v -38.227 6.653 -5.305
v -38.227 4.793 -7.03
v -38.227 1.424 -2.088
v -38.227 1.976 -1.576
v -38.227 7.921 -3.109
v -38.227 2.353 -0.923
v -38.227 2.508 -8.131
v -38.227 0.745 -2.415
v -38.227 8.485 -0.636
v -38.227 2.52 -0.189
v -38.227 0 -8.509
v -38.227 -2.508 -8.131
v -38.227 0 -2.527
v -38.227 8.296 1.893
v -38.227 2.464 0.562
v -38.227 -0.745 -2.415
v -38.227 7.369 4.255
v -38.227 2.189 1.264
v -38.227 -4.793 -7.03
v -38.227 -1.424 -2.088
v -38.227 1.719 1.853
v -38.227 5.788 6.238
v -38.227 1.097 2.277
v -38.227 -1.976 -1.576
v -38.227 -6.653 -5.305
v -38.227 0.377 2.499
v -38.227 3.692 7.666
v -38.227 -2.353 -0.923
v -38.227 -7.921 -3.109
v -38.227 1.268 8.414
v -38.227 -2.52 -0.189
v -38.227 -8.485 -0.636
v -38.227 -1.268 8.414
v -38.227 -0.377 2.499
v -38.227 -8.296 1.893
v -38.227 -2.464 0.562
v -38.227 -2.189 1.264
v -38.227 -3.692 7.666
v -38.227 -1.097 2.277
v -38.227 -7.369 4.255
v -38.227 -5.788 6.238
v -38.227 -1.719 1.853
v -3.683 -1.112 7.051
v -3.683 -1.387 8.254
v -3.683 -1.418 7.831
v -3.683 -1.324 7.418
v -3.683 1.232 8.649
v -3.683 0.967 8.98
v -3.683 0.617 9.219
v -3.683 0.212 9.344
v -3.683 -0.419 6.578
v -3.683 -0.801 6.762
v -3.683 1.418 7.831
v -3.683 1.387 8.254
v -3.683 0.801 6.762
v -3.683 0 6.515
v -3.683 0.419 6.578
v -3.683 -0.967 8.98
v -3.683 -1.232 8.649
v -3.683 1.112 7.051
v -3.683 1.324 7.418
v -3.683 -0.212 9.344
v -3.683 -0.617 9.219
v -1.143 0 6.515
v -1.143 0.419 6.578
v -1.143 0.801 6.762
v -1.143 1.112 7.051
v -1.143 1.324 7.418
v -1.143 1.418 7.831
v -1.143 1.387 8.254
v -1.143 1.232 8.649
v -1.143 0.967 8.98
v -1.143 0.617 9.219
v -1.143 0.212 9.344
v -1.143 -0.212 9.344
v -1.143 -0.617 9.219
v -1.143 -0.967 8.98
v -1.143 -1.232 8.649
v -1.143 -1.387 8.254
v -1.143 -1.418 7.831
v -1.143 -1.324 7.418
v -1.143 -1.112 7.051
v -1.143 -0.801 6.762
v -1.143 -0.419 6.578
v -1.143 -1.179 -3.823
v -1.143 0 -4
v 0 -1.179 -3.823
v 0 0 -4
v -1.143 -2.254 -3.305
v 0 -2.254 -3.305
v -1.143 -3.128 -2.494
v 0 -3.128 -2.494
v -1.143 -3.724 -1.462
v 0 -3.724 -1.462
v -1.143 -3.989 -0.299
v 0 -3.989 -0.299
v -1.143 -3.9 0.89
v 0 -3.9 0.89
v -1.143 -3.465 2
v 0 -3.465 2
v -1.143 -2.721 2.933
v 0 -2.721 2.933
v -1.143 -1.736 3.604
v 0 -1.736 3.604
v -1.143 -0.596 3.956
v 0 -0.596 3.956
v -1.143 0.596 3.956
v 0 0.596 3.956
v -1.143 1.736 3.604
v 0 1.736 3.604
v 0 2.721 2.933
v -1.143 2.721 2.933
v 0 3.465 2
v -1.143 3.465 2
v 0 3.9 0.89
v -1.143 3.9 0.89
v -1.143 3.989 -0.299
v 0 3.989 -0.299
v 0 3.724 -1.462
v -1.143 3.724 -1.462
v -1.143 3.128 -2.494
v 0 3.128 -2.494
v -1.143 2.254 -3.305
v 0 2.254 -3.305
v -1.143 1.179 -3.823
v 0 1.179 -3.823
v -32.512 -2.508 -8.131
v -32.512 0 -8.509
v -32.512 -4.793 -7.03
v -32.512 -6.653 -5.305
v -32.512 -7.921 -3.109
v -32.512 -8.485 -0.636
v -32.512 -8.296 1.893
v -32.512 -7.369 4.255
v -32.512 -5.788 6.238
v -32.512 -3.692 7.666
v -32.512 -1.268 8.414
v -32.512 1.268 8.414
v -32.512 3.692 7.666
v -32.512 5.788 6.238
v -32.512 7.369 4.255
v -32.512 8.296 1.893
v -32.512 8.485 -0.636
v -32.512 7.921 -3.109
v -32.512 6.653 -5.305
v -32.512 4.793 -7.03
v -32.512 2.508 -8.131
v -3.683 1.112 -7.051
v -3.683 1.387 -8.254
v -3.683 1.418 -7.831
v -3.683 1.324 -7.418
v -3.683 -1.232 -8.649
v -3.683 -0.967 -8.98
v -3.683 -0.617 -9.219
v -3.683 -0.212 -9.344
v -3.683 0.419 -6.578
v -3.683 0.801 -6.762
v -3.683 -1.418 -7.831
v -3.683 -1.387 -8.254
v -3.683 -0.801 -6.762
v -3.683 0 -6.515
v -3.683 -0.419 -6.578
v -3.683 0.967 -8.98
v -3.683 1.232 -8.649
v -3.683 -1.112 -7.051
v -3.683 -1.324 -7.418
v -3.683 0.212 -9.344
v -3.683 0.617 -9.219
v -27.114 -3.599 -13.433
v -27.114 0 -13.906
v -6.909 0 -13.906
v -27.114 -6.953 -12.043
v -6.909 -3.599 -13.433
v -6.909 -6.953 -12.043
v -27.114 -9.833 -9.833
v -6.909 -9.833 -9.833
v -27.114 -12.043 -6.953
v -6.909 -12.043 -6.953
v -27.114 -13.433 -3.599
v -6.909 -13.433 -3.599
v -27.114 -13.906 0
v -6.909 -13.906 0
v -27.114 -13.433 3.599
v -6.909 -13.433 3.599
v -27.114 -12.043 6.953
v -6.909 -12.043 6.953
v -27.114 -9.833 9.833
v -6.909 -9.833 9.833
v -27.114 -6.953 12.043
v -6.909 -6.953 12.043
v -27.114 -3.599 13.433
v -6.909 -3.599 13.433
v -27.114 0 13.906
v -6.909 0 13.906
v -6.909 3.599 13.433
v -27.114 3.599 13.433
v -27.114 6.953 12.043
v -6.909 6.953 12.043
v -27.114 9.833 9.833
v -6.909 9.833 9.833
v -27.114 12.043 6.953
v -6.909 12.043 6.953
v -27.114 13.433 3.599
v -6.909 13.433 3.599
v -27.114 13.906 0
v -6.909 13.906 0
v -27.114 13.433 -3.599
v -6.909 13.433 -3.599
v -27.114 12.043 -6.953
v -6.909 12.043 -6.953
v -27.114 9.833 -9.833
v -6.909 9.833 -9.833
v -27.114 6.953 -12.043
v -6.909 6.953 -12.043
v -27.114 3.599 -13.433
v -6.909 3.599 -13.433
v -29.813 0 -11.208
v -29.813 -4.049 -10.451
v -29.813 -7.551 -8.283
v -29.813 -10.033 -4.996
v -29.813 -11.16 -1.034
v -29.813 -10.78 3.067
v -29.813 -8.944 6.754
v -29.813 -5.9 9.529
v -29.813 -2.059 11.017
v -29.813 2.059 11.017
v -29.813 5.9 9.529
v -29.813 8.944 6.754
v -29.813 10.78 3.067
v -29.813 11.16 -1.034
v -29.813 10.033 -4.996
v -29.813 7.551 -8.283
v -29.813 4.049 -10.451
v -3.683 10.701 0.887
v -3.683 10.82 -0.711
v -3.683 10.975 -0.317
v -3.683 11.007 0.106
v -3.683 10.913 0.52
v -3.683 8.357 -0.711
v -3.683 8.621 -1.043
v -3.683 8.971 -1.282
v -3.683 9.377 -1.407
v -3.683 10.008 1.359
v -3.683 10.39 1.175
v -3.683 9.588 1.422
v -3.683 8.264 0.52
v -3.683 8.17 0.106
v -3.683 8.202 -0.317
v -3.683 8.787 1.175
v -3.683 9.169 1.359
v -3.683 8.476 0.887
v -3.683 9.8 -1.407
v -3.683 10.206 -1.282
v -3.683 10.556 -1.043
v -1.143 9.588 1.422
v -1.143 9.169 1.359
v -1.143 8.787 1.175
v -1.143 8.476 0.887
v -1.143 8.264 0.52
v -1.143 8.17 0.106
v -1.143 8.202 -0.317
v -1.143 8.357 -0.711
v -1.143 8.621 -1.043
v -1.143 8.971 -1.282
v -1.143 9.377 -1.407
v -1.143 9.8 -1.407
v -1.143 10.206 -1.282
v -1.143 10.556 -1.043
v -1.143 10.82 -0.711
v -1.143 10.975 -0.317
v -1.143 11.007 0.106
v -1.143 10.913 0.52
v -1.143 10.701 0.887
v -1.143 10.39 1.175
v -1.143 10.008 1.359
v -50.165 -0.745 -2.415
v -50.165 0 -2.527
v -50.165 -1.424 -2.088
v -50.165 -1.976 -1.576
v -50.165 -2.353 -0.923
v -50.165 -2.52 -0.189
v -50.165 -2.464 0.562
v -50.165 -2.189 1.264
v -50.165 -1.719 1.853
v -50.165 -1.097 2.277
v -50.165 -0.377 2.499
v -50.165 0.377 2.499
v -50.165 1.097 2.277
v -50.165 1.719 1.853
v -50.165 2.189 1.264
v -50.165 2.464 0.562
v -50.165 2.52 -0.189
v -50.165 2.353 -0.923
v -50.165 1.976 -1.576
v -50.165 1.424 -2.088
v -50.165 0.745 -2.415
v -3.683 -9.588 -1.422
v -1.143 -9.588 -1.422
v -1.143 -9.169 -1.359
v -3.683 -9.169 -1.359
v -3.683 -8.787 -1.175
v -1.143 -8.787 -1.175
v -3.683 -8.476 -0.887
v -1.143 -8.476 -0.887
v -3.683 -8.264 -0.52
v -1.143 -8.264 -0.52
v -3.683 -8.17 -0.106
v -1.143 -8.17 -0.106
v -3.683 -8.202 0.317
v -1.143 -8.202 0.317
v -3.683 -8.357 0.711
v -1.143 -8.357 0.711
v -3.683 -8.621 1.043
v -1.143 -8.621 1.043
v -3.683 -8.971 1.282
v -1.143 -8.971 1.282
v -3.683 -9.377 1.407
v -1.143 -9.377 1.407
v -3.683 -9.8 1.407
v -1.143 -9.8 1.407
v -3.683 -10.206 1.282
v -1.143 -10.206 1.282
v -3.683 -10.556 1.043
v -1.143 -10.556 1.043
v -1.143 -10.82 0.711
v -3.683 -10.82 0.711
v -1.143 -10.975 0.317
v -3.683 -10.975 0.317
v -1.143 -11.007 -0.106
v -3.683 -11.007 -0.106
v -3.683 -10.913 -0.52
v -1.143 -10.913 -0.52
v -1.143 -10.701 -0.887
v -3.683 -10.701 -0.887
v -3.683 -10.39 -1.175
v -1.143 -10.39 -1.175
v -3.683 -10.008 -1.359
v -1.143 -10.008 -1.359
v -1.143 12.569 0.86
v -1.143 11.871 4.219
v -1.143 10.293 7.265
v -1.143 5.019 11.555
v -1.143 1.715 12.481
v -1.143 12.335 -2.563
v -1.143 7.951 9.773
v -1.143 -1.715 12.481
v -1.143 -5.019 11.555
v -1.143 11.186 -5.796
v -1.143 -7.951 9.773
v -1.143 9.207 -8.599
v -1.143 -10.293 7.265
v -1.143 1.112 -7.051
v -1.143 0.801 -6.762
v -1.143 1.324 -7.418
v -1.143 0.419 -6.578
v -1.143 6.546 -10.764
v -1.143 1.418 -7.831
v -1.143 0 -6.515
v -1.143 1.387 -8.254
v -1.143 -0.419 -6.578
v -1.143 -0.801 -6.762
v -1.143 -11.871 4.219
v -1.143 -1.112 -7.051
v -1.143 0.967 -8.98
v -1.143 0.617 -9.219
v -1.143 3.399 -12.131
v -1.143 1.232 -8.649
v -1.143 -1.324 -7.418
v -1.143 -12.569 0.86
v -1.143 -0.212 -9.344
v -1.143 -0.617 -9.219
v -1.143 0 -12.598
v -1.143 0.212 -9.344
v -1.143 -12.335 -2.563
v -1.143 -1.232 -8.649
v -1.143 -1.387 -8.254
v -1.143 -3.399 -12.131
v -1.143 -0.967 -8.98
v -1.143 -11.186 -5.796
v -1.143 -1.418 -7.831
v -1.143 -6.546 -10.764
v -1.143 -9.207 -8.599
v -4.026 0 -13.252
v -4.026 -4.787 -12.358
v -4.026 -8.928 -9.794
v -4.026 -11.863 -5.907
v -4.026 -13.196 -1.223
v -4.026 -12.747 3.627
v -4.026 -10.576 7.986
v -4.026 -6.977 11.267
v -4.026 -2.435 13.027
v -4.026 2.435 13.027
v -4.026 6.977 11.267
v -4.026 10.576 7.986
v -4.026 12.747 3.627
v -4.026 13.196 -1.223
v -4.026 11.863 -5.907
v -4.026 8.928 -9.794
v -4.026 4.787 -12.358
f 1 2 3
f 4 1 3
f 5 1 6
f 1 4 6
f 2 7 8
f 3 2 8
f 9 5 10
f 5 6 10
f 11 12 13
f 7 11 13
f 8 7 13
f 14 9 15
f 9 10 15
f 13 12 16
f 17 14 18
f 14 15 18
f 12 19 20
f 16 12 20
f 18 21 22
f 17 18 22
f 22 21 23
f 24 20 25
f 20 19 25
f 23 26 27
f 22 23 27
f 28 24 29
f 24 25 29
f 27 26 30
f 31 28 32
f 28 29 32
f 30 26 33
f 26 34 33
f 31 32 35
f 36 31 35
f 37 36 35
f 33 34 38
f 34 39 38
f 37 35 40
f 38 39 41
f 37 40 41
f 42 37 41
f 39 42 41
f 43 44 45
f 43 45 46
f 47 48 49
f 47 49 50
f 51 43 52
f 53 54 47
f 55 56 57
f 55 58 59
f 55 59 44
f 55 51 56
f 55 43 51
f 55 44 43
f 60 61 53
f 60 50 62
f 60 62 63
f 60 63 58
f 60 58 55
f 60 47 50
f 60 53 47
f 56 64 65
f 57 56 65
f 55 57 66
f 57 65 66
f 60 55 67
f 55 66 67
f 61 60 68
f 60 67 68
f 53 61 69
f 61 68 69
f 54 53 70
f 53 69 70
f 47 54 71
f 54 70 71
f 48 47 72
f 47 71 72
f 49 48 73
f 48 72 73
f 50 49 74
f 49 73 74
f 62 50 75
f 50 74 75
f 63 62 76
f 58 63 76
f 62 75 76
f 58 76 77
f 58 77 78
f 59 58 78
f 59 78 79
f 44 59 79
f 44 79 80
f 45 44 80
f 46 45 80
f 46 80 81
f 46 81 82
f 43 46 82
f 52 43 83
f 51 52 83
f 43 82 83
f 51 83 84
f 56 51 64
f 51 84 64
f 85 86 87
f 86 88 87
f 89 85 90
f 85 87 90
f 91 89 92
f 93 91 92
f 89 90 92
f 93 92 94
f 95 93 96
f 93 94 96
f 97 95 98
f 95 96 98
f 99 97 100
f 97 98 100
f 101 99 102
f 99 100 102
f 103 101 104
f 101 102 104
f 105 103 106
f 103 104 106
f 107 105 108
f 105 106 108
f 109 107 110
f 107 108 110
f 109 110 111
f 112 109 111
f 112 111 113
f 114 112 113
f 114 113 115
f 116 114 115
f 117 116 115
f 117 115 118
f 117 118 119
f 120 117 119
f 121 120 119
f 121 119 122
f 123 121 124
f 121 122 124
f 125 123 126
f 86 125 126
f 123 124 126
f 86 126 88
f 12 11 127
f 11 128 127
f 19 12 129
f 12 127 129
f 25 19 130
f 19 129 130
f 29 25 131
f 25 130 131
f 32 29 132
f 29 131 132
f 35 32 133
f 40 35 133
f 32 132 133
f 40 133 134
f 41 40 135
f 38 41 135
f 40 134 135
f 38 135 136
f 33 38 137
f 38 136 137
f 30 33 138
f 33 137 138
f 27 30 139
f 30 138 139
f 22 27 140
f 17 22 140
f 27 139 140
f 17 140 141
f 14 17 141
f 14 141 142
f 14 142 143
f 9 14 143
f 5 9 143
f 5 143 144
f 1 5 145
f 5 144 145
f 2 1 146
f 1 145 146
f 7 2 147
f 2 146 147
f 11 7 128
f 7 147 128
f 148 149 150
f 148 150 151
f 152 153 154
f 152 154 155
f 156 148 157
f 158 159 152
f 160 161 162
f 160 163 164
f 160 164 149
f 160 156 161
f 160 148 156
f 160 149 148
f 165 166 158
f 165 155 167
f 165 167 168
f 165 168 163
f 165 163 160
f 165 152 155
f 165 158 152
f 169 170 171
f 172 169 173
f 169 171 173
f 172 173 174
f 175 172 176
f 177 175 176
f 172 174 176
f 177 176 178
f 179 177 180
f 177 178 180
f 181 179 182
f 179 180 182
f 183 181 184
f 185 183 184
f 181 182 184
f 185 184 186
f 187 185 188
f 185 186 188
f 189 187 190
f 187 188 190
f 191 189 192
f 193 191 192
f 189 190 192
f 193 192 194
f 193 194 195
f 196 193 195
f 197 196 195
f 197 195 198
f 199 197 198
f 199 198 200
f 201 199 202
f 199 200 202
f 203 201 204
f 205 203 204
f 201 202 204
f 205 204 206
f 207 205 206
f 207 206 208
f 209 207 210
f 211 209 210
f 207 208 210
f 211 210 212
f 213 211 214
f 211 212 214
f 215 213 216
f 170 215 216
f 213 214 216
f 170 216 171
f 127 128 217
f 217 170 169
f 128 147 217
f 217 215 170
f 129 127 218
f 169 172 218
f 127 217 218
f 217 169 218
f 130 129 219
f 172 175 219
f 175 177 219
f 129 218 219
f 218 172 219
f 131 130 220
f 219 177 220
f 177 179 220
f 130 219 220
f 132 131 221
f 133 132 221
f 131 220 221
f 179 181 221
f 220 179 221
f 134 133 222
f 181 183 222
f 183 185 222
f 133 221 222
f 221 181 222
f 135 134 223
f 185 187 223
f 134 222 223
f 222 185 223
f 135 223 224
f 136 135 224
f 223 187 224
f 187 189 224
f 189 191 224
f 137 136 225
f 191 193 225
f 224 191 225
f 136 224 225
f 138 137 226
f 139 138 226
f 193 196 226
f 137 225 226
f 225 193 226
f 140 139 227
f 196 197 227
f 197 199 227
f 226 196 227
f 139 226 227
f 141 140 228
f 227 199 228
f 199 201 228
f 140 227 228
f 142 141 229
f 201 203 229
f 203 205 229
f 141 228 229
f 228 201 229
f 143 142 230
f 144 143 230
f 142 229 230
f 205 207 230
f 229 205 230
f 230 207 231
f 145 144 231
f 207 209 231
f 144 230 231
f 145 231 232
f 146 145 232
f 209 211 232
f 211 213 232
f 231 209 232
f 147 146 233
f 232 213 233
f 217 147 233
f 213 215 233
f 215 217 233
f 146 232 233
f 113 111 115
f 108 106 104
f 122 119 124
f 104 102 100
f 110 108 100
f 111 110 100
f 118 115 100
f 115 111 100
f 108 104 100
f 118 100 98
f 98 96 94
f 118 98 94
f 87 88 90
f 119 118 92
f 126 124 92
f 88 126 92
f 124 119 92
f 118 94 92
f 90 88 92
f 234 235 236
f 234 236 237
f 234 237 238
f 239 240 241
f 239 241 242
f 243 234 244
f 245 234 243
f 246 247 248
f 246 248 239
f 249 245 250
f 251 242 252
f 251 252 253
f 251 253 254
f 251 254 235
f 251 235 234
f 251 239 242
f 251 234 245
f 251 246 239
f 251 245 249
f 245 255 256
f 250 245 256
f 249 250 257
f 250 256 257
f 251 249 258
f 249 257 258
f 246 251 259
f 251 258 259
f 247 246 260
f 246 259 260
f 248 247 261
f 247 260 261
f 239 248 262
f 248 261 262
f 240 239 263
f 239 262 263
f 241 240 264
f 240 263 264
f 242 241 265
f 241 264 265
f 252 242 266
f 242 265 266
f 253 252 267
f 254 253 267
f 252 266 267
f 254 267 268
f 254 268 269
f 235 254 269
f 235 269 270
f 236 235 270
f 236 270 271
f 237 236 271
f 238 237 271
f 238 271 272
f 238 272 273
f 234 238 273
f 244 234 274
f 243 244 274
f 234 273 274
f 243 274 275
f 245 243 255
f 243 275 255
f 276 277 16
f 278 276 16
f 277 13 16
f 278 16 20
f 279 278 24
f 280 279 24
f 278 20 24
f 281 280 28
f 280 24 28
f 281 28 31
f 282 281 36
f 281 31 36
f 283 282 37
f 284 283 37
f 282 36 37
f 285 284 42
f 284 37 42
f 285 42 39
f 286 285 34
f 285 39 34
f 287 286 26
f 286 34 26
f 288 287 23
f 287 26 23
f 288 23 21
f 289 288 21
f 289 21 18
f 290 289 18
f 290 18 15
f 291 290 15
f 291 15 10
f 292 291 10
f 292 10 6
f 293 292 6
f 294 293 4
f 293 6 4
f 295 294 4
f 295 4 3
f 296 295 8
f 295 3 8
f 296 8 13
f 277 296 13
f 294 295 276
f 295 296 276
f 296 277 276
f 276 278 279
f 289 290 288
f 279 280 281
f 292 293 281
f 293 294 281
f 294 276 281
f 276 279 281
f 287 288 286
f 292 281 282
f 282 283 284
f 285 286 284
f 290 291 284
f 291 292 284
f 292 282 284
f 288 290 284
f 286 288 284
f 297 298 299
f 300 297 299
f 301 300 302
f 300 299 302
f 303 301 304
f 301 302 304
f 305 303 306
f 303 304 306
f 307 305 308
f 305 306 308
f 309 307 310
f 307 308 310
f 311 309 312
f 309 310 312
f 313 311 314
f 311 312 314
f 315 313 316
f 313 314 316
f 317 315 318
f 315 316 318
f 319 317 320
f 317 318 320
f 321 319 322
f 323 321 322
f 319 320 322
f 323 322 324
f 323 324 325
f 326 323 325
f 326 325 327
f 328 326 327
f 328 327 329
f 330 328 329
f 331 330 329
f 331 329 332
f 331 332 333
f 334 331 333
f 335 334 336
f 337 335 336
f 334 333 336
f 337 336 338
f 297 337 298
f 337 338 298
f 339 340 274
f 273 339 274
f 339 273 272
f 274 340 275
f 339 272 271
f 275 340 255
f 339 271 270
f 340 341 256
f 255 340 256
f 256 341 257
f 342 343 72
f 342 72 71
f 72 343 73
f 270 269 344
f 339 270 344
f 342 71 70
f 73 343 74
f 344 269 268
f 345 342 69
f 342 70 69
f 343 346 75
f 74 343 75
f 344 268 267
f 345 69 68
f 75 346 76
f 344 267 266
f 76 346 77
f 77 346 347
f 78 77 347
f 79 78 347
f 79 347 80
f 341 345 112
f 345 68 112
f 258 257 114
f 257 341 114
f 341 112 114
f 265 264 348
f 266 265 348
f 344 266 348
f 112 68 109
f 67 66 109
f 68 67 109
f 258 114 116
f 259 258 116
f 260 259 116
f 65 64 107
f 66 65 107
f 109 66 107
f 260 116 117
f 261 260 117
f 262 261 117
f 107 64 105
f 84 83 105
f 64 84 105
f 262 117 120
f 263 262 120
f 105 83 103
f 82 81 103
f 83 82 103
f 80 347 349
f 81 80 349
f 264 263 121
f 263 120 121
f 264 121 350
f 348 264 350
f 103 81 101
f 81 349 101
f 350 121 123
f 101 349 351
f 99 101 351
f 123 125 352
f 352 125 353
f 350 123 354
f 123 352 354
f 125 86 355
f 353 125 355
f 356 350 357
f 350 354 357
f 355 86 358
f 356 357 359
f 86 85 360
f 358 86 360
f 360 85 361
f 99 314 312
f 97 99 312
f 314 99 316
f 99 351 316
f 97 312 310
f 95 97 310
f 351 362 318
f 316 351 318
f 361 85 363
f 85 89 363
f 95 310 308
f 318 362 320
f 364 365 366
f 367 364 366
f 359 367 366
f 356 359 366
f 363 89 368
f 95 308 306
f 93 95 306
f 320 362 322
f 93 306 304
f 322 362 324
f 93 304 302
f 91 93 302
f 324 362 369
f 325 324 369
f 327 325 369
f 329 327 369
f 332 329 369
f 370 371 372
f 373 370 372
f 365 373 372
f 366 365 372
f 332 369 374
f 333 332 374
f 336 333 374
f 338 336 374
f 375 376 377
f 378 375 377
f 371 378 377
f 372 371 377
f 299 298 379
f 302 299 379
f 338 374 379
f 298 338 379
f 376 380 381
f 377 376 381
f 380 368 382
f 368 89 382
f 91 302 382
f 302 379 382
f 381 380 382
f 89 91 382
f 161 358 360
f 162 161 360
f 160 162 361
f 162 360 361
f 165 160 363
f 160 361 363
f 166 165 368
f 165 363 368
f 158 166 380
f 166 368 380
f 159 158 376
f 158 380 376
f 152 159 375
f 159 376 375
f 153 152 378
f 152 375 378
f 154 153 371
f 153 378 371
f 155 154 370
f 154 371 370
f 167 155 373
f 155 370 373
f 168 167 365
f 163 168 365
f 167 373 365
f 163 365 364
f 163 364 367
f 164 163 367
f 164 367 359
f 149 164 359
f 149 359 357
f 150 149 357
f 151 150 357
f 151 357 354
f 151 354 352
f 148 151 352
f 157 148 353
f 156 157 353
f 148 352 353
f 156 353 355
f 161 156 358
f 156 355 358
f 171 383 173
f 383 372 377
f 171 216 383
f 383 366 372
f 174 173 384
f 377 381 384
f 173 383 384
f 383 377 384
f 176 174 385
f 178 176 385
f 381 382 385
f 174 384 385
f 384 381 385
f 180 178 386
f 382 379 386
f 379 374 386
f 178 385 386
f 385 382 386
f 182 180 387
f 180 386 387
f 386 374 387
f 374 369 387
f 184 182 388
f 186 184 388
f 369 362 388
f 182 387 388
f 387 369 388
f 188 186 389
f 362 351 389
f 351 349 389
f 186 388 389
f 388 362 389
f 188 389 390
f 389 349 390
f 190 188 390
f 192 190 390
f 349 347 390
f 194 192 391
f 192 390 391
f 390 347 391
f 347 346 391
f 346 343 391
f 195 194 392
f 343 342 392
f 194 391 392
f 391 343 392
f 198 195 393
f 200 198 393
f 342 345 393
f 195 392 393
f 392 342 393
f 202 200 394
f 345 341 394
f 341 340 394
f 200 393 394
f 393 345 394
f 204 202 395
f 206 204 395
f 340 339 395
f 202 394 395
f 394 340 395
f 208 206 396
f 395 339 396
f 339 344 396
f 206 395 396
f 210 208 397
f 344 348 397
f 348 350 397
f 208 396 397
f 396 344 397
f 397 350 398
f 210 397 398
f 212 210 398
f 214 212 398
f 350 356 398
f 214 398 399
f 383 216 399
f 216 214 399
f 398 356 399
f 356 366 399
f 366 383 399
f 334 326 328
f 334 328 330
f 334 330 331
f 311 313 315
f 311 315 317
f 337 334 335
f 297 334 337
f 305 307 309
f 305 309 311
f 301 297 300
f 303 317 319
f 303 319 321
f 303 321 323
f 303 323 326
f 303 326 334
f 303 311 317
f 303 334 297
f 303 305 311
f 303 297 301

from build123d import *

# Parameters (mm, degrees)
SKETCH2_R          = 1.4224
CUT_EXTRUDE1_DEPTH = 2.54


with BuildPart() as part:
    # Sketch1 → Revolve1 (revolve)
    with BuildSketch(Plane(origin=(0, 0, 0), x_dir=(-1, 0, 0), z_dir=(0, 1, 0)), mode=Mode.PRIVATE) as revolve1_sk:
        Polygon((0, 0), (50.165, 0), (50.165, 2.5273), (38.227, 2.5273), (38.227, 8.509), (32.512, 8.509), (27.1145, 13.9065), (6.9088, 13.9065), (1.143, 12.5984), (1.143, 4.0005), (0, 4.0005), align=None)
    revolve(revolve1_sk.sketch.rotate(Axis((0, 0, 0), (-1, 0, 0)), 180), axis=Axis((0, 0, 0), (-1, 0, 0)))

    # Sketch2 → Cut-Extrude1 (cut)
    with BuildSketch(Plane.YZ.offset(-1.143)):
        with Locations(Location((0, 7.9375, 0), (0, 0, 270))):
            Circle(SKETCH2_R)
        with Locations(Location((-9.5885, 0, 0), (0, 0, 270))):
            Circle(SKETCH2_R)
        with Locations(Location((0, -7.9375, 0), (0, 0, 90))):
            Circle(SKETCH2_R)
        with Locations(Location((9.5885, 0, 0), (0, 0, 90))):
            Circle(SKETCH2_R)
    extrude(amount=-CUT_EXTRUDE1_DEPTH, mode=Mode.SUBTRACT)


solid = part.part
